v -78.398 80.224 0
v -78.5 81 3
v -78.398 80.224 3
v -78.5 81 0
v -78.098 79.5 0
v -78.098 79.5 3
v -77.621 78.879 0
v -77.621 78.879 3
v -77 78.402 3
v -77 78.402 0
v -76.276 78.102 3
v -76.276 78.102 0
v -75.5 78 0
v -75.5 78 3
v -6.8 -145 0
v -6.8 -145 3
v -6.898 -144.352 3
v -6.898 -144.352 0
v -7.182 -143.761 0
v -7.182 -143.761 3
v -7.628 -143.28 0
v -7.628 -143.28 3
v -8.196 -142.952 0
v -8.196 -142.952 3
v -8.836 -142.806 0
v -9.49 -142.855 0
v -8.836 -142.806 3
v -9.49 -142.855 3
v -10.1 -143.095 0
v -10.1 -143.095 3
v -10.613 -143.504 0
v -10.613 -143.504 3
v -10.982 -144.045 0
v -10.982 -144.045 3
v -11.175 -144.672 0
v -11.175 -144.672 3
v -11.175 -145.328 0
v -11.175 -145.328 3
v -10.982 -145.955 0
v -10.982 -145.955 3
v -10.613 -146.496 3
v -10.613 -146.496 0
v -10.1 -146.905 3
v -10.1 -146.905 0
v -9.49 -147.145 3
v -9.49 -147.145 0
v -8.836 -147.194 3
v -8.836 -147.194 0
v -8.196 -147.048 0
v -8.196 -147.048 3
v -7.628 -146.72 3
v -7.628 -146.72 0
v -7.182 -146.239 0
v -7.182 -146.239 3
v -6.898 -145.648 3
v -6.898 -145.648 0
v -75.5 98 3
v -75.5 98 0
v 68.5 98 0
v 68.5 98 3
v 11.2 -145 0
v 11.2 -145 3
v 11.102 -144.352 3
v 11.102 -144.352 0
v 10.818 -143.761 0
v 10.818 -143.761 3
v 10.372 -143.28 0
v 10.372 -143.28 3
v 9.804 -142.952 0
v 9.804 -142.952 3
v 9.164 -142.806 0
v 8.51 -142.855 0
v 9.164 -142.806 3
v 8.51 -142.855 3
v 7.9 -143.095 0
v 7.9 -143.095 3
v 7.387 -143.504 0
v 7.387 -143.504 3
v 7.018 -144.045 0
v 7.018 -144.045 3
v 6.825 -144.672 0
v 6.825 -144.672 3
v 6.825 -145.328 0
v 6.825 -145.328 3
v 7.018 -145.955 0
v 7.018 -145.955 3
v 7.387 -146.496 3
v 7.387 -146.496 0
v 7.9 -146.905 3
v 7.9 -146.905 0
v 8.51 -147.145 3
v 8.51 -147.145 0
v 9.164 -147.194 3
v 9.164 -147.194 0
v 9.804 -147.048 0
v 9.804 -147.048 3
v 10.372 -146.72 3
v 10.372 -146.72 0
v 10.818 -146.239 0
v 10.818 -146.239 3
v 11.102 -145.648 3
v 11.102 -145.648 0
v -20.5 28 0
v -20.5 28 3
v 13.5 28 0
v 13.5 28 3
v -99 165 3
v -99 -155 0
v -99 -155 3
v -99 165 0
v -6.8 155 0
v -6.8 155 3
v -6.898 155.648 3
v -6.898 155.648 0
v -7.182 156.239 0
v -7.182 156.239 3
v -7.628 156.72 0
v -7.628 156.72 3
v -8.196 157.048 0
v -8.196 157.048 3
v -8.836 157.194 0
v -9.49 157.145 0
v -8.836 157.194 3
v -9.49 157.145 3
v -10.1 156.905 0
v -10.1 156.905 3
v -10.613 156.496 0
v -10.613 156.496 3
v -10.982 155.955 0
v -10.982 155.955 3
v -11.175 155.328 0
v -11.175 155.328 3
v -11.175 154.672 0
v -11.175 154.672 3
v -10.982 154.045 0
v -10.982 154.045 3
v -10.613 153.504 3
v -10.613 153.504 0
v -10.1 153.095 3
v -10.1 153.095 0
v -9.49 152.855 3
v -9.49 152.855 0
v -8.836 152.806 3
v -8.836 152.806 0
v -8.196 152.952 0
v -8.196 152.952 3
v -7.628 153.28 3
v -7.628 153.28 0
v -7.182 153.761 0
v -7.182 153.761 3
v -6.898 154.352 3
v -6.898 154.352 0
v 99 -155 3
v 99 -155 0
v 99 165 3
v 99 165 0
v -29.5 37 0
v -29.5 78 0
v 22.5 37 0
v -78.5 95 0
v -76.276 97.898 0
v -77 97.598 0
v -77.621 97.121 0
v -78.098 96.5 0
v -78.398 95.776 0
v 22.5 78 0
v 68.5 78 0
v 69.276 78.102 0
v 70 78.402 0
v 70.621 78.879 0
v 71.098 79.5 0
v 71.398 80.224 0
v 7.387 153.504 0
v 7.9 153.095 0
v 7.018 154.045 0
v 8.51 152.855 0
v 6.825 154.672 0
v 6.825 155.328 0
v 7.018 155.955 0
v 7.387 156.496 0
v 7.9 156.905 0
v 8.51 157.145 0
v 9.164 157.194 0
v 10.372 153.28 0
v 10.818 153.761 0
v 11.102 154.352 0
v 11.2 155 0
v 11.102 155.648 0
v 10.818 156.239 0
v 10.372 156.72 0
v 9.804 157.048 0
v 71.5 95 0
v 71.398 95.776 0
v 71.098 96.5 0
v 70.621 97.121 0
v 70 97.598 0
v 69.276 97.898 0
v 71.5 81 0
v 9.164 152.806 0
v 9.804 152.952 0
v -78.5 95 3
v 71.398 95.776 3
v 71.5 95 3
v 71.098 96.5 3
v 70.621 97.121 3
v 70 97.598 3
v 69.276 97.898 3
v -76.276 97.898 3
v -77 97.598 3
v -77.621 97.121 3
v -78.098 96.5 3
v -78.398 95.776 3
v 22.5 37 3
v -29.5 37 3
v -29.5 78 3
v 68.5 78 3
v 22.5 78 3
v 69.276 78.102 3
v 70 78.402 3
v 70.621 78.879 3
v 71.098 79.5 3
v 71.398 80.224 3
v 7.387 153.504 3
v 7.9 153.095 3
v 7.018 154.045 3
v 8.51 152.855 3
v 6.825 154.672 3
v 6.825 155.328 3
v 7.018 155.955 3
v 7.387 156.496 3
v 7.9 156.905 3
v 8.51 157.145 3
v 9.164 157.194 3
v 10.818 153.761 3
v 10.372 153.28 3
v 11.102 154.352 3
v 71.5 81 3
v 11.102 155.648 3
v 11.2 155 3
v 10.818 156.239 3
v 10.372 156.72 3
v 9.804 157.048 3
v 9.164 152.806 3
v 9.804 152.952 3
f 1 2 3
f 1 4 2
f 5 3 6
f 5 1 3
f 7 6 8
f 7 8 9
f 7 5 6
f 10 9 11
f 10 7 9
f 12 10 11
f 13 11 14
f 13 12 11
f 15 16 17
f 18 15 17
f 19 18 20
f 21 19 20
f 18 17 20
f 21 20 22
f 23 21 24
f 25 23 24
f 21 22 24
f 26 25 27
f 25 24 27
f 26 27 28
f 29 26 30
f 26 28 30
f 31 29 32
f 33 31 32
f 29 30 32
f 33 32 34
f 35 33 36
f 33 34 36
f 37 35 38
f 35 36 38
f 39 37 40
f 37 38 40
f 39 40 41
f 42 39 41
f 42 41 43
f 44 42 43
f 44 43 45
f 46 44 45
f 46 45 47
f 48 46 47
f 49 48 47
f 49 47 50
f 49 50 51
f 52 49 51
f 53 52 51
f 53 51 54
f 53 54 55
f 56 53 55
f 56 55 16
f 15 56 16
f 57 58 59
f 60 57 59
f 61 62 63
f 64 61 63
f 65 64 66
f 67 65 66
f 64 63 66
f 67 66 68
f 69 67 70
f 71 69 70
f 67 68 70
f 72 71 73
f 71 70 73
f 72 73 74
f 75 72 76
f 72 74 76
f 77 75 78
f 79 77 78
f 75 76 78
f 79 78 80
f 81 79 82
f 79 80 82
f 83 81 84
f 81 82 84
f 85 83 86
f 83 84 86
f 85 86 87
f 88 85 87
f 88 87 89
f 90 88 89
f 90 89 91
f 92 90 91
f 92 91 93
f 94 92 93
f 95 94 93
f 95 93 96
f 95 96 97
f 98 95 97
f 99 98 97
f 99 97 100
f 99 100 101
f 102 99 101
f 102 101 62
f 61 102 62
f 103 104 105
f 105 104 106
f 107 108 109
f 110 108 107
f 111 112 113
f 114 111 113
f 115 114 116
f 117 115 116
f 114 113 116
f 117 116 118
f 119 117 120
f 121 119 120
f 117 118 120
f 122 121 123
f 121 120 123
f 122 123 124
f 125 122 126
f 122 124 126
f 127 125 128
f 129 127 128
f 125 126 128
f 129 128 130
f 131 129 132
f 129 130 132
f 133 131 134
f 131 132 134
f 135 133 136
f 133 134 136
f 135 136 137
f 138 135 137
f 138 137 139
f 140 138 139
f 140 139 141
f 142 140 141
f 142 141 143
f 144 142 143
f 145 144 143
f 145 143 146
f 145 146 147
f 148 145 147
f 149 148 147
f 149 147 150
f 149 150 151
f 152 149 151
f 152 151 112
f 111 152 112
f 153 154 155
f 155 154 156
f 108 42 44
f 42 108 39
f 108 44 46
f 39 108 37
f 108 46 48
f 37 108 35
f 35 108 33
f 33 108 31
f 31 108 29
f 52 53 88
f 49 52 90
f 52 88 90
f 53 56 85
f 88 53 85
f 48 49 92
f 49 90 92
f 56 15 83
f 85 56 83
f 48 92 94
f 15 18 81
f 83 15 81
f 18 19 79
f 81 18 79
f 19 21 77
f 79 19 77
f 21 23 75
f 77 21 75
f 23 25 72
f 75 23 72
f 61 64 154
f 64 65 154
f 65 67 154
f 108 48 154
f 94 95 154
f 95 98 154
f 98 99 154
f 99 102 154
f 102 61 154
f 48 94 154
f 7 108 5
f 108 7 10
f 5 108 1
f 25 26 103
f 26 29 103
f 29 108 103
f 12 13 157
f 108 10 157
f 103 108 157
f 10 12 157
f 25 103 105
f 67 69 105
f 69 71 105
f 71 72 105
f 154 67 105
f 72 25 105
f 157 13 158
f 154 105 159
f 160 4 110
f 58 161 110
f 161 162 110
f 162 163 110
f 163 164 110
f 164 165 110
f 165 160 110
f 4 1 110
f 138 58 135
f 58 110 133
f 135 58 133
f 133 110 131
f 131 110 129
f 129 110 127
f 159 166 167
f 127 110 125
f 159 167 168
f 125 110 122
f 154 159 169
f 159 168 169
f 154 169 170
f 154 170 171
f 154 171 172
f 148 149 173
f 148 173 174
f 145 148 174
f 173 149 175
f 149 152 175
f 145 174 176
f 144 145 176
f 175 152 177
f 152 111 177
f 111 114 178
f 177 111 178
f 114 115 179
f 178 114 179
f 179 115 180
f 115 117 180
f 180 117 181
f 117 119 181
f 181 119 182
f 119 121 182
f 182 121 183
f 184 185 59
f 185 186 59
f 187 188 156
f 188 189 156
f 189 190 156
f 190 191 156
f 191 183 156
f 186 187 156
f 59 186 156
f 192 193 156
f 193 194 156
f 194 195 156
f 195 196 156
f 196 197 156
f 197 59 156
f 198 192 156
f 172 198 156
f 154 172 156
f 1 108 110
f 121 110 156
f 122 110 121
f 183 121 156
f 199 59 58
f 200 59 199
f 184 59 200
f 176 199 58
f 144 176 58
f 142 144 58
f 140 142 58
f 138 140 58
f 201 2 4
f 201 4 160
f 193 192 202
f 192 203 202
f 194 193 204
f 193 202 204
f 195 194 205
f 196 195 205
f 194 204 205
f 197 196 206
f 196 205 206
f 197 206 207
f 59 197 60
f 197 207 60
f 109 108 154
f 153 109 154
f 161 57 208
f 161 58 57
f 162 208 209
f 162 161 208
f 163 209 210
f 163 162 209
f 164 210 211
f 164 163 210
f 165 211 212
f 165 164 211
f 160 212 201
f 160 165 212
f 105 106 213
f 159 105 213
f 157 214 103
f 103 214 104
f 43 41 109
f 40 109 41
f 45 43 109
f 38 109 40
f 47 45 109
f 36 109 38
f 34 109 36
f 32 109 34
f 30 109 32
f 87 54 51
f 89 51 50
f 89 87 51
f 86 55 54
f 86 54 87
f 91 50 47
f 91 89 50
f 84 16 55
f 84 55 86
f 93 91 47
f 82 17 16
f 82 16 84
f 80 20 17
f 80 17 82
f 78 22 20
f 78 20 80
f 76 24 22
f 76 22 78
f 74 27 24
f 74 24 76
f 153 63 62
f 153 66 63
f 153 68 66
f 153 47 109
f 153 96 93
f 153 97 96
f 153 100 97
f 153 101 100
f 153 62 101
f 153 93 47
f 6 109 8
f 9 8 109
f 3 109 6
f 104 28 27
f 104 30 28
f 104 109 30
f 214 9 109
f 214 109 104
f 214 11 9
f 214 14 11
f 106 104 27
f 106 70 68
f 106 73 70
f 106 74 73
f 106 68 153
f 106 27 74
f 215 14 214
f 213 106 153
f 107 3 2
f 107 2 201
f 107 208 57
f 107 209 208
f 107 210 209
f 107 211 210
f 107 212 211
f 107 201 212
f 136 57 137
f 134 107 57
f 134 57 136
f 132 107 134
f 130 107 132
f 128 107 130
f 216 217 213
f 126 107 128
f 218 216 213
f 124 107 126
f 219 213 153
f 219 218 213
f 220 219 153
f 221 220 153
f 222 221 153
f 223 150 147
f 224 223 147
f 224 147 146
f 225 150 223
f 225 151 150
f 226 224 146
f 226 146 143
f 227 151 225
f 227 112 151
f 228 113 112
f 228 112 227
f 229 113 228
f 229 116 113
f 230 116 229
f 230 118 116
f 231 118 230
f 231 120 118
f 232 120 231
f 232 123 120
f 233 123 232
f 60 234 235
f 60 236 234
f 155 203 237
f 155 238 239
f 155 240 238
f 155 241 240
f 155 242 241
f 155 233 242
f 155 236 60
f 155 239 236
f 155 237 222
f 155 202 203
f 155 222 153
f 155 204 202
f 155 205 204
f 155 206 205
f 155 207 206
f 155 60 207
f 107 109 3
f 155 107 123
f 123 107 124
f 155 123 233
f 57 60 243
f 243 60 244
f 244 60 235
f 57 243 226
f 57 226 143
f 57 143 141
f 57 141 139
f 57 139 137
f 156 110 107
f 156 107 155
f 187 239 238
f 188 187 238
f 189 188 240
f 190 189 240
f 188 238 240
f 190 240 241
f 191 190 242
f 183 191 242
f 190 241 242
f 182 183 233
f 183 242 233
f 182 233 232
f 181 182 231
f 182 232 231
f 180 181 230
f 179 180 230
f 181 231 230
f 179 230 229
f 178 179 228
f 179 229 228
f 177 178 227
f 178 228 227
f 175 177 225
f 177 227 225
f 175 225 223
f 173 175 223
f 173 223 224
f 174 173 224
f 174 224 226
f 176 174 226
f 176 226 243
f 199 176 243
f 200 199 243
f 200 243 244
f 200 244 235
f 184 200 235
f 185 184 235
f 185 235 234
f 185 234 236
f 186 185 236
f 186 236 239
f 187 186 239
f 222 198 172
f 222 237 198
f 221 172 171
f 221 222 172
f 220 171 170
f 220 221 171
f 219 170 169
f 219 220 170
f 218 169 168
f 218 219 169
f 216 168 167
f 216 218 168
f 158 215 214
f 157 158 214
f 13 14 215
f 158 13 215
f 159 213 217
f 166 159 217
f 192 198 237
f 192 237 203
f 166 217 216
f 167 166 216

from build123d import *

# Parameters (mm, degrees)
ESQUISSE1_W                  = 198
ESQUISSE1_H                  = 320
BOSS_EXTRU_1_DEPTH           = 3
ENL_V_MAT_EXTRU_1_REACH      = 194.445
ESQUISSE2_R                  = 2.2
ENL_V_MAT_EXTRU_4_REACH      = 194.445
ESQUISSE5_W                  = 20
ESQUISSE5_H                  = 20
ENL_V_MAT_EXTRU_5_DEPTH      = 193.44479728
ENL_V_MAT_EXTRU_5_DEPTH_BACK = 193.44479728
ESQUISSE7_W                  = 37
ESQUISSE7_H                  = 20
ESQUISSE7_W_2                = 16
CONG_2_R                     = 3
ENL_V_MAT_EXTRU_6_REACH      = 194.445


with BuildPart() as part:
    # Esquisse1 → Boss.-Extru.1 (new body)
    with BuildSketch(Plane.XY):
        with Locations((0, 5)):
            Rectangle(ESQUISSE1_W, ESQUISSE1_H)
    extrude(amount=BOSS_EXTRU_1_DEPTH)

    # Esquisse2 → Enlèv. mat.-Extru.1 (cut, up to next)
    with BuildSketch(Plane.XY.offset(3), mode=Mode.PRIVATE) as enl_v_mat_extru_1_sk1:
        with Locations((9, -145)):
            Circle(ESQUISSE2_R)
    enl_v_mat_extru_1_tool1 = extrude(enl_v_mat_extru_1_sk1.sketch, amount=-ENL_V_MAT_EXTRU_1_REACH, mode=Mode.PRIVATE) & part.part
    # Esquisse2 → Enlèv. mat.-Extru.1 (cut, up to next)
    with BuildSketch(Plane.XY.offset(3), mode=Mode.PRIVATE) as enl_v_mat_extru_1_sk2:
        with Locations((-9, -145)):
            Circle(ESQUISSE2_R)
    enl_v_mat_extru_1_tool2 = extrude(enl_v_mat_extru_1_sk2.sketch, amount=-ENL_V_MAT_EXTRU_1_REACH, mode=Mode.PRIVATE) & part.part
    # Esquisse2 → Enlèv. mat.-Extru.1 (cut, up to next)
    with BuildSketch(Plane.XY.offset(3), mode=Mode.PRIVATE) as enl_v_mat_extru_1_sk3:
        with Locations((-9, 155)):
            Circle(ESQUISSE2_R)
    enl_v_mat_extru_1_tool3 = extrude(enl_v_mat_extru_1_sk3.sketch, amount=-ENL_V_MAT_EXTRU_1_REACH, mode=Mode.PRIVATE) & part.part
    # Esquisse2 → Enlèv. mat.-Extru.1 (cut, up to next)
    with BuildSketch(Plane.XY.offset(3), mode=Mode.PRIVATE) as enl_v_mat_extru_1_sk4:
        with Locations((9, 155)):
            Circle(ESQUISSE2_R)
    enl_v_mat_extru_1_tool4 = extrude(enl_v_mat_extru_1_sk4.sketch, amount=-ENL_V_MAT_EXTRU_1_REACH, mode=Mode.PRIVATE) & part.part
    add(enl_v_mat_extru_1_tool1.solids().sort_by_distance((9, -145, 3))[0], mode=Mode.SUBTRACT)
    add(enl_v_mat_extru_1_tool2.solids().sort_by_distance((-9, -145, 3))[0], mode=Mode.SUBTRACT)
    add(enl_v_mat_extru_1_tool3.solids().sort_by_distance((-9, 155, 3))[0], mode=Mode.SUBTRACT)
    add(enl_v_mat_extru_1_tool4.solids().sort_by_distance((9, 155, 3))[0], mode=Mode.SUBTRACT)

    # Esquisse5 → Enlèv. mat.-Extru.4 (cut, up to next)
    with BuildSketch(Plane.XY.offset(3), mode=Mode.PRIVATE) as enl_v_mat_extru_4_sk1:
        with Locations((-68.5, 88)):
            Rectangle(ESQUISSE5_W, ESQUISSE5_H)
    enl_v_mat_extru_4_tool1 = extrude(enl_v_mat_extru_4_sk1.sketch, amount=-ENL_V_MAT_EXTRU_4_REACH, mode=Mode.PRIVATE) & part.part
    # Esquisse5 → Enlèv. mat.-Extru.4 (cut, up to next)
    with BuildSketch(Plane.XY.offset(3), mode=Mode.PRIVATE) as enl_v_mat_extru_4_sk2:
        with Locations((-11.5, 88)):
            Rectangle(ESQUISSE5_W, ESQUISSE5_H)
    enl_v_mat_extru_4_tool2 = extrude(enl_v_mat_extru_4_sk2.sketch, amount=-ENL_V_MAT_EXTRU_4_REACH, mode=Mode.PRIVATE) & part.part
    # Esquisse5 → Enlèv. mat.-Extru.4 (cut, up to next)
    with BuildSketch(Plane.XY.offset(3), mode=Mode.PRIVATE) as enl_v_mat_extru_4_sk3:
        with Locations((45.5, 88)):
            Rectangle(ESQUISSE5_W, ESQUISSE5_H)
    enl_v_mat_extru_4_tool3 = extrude(enl_v_mat_extru_4_sk3.sketch, amount=-ENL_V_MAT_EXTRU_4_REACH, mode=Mode.PRIVATE) & part.part
    add(enl_v_mat_extru_4_tool1.solids().sort_by_distance((-68.5, 88, 3))[0], mode=Mode.SUBTRACT)
    add(enl_v_mat_extru_4_tool2.solids().sort_by_distance((-11.5, 88, 3))[0], mode=Mode.SUBTRACT)
    add(enl_v_mat_extru_4_tool3.solids().sort_by_distance((45.5, 88, 3))[0], mode=Mode.SUBTRACT)

    # Esquisse7 → Enlèv. mat.-Extru.5 (cut, two sides: drawn at the far end of the back side and taken through both)
    with BuildSketch(Plane.XY.offset(3).offset(-ENL_V_MAT_EXTRU_5_DEPTH_BACK)):
        with Locations((-40, 88)):
            Rectangle(ESQUISSE7_W, ESQUISSE7_H)
        with Locations((17, 88)):
            Rectangle(ESQUISSE7_W, ESQUISSE7_H)
        with Locations((63.5, 88)):
            Rectangle(ESQUISSE7_W_2, ESQUISSE7_H)
    extrude(amount=ENL_V_MAT_EXTRU_5_DEPTH + ENL_V_MAT_EXTRU_5_DEPTH_BACK, mode=Mode.SUBTRACT)

    # Congé2
    cong_2_edges = [part.edges().sort_by_distance(p)[0] for p in [
        (-78.5, 78, 1.5),
        (-78.5, 98, 1.5),
        (71.5, 98, 1.5),
        (71.5, 78, 1.5),
    ]]
    fillet(cong_2_edges, radius=CONG_2_R)

    # Esquisse9 → Enlèv. mat.-Extru.6 (cut, up to next)
    with BuildSketch(Plane.XY.offset(3), mode=Mode.PRIVATE) as enl_v_mat_extru_6_sk1:
        Polygon((-3.5, 28), (13.5, 28), (22.5, 37), (22.5, 78), (-29.5, 78), (-29.5, 37), (-20.5, 28), align=None)
    enl_v_mat_extru_6_tool1 = extrude(enl_v_mat_extru_6_sk1.sketch, amount=-ENL_V_MAT_EXTRU_6_REACH, mode=Mode.PRIVATE) & part.part
    add(enl_v_mat_extru_6_tool1.solids().sort_by_distance((-3.5, 53.707424, 3))[0], mode=Mode.SUBTRACT)


solid = part.part
